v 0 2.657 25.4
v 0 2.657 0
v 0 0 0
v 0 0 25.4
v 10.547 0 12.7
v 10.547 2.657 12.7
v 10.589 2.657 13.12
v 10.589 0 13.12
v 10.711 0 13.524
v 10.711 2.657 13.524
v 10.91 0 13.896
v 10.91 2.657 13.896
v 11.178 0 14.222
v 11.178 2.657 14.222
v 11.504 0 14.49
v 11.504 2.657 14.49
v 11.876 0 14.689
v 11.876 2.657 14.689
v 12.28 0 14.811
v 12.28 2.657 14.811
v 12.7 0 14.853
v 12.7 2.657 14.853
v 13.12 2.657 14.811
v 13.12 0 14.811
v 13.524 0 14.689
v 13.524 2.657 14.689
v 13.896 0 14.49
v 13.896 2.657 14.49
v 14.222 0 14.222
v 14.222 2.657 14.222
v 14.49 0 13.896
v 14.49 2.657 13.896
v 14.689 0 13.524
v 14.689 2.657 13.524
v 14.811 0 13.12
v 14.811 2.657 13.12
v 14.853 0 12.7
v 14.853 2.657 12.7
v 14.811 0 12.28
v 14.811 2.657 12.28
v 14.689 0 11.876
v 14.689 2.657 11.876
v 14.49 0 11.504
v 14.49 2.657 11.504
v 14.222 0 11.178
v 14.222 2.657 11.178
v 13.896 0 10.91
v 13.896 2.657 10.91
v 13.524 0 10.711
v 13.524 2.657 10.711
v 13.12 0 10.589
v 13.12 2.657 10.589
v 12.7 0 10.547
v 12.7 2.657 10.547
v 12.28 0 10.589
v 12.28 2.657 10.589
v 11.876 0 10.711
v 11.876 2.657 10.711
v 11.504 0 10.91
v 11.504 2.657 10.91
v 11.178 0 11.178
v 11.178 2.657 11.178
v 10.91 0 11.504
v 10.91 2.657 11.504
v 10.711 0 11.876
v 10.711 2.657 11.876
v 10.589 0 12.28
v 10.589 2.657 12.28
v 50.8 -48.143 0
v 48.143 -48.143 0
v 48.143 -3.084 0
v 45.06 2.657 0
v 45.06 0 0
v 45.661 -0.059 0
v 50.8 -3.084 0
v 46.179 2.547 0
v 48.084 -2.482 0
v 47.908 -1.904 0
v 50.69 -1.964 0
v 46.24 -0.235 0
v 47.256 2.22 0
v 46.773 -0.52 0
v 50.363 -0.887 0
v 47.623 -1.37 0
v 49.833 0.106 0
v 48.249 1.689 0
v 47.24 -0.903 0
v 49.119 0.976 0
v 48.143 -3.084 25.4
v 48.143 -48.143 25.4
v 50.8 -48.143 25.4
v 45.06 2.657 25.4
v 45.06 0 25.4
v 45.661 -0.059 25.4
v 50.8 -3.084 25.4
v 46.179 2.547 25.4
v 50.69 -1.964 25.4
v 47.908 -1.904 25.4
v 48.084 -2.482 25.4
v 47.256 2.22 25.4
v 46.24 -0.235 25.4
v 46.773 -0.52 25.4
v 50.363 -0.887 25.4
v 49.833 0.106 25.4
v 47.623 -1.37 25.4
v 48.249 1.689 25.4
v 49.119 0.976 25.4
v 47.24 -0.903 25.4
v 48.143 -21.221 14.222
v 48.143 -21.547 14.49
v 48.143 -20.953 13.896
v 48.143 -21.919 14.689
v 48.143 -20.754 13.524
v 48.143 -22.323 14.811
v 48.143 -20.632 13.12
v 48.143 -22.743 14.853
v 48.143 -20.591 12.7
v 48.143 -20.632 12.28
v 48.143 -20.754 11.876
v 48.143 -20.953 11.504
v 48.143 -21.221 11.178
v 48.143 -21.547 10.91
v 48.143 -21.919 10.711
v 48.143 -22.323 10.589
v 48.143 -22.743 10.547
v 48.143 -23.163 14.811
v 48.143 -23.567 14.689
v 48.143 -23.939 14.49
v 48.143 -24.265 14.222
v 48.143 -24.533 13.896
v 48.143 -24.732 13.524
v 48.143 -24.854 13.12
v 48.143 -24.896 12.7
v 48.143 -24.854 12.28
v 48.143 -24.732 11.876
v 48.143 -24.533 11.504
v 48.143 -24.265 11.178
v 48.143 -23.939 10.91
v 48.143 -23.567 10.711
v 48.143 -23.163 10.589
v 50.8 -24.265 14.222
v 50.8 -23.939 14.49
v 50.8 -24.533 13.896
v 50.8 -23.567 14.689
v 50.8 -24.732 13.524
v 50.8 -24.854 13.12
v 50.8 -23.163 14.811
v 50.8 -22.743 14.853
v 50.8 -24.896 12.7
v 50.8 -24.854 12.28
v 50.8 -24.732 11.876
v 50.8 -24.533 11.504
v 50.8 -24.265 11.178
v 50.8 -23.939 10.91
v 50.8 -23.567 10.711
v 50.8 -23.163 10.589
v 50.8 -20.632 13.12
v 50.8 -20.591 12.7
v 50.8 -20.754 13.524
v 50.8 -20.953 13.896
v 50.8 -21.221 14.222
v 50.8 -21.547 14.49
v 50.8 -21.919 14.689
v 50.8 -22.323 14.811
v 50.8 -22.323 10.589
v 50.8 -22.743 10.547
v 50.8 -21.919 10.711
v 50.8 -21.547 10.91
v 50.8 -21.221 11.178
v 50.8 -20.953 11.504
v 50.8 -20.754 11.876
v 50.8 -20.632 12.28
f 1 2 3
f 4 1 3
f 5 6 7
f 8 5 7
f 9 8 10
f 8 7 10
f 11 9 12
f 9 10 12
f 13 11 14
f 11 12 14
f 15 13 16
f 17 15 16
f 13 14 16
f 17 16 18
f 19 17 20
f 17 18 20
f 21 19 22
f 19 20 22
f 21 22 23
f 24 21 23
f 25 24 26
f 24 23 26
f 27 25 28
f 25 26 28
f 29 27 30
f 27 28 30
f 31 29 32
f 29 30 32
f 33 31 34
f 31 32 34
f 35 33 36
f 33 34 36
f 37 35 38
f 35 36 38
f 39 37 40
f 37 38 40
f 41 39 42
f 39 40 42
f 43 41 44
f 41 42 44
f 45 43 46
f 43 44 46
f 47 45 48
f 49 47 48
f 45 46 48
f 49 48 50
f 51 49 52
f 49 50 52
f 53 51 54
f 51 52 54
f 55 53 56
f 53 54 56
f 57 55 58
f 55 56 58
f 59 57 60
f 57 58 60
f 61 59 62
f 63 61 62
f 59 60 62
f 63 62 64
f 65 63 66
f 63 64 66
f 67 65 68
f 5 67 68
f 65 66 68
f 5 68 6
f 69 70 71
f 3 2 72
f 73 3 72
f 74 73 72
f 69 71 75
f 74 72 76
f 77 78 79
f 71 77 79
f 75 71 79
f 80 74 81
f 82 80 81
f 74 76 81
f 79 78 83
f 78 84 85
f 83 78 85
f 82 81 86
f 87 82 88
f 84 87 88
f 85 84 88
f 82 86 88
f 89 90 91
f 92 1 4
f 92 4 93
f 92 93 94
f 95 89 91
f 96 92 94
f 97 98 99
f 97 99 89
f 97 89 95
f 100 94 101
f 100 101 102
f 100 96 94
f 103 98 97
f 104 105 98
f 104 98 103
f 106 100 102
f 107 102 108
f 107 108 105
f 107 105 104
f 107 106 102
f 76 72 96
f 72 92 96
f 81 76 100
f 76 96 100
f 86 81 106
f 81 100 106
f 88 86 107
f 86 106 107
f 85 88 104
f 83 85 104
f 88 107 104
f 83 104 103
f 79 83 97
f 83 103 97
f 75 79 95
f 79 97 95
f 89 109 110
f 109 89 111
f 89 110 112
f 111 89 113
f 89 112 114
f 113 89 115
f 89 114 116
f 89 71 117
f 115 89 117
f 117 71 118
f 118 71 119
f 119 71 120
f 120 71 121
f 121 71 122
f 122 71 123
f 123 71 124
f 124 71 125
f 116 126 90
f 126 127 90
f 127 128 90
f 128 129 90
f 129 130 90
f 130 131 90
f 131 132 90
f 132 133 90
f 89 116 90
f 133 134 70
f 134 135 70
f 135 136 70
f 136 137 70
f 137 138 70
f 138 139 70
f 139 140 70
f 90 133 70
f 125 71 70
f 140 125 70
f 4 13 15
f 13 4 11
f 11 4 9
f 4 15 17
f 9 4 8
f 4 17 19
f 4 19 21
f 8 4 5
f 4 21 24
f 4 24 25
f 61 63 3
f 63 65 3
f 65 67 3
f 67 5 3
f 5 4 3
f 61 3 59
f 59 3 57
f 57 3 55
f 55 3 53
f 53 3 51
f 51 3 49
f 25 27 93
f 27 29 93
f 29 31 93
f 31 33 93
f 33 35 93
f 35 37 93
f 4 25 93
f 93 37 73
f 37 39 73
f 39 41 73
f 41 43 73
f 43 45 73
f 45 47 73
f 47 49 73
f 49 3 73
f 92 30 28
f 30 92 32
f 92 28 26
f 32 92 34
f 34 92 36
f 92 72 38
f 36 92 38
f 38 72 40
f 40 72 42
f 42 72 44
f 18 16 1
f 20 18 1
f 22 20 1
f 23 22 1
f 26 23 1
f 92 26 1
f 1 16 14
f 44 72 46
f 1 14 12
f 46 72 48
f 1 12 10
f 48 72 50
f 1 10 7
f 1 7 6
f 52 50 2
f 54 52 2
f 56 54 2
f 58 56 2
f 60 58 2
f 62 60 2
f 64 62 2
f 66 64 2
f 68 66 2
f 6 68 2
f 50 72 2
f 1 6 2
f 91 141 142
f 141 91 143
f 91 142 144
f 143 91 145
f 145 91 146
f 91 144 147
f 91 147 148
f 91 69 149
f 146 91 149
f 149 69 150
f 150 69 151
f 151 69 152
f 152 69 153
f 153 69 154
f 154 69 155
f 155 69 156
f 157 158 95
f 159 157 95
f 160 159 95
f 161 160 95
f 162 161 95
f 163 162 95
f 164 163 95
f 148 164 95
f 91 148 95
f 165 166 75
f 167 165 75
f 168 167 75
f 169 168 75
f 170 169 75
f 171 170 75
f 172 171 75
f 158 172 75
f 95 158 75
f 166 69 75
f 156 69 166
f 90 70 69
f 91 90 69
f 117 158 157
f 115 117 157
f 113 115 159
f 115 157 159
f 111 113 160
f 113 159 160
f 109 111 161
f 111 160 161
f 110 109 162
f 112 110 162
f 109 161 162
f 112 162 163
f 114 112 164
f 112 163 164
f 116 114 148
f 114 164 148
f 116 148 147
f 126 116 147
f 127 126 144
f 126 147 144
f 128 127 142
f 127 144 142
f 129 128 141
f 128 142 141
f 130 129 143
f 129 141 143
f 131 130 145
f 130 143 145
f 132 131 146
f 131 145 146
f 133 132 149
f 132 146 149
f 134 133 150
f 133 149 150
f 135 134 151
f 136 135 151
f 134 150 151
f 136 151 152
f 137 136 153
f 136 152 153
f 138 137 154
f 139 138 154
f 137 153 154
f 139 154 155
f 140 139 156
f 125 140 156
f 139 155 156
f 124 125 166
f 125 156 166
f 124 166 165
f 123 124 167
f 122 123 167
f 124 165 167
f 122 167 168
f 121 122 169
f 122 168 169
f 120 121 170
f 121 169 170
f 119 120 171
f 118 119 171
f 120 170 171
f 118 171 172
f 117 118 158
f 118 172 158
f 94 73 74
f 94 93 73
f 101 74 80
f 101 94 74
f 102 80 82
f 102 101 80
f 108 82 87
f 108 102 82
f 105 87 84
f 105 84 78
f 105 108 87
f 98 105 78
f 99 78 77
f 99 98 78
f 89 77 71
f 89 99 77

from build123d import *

# Parameters (mm, degrees)
F1_DEPTH = 25.4
F2_R     = 2.15265
F3_DEPTH = 2.65684
F4_R     = 2.15265
F5_DEPTH = 2.65684
F6_R     = 3.08356
F7_R     = 5.7404


with BuildPart() as f1:
    # F0 (on Top) → F1 (new body)
    with BuildSketch(Plane.XY):
        Polygon((0, 2.65684), (0, 0), (48.14316, 0), (48.14316, -48.14316), (50.8, -48.14316), (50.8, 2.65684), align=None)
    extrude(amount=F1_DEPTH)

    # F2 (on face) → F3 (cut, through all)
    with BuildSketch(Plane(origin=(0, 2.65684, 0), x_dir=(-1, 0, 0), z_dir=(0, 1, 0))):
        with Locations((-12.7, 12.7)):
            Circle(F2_R)
    extrude(amount=-F3_DEPTH, mode=Mode.SUBTRACT)

    # F4 (on face) → F5 (cut, through all)
    with BuildSketch(Plane.YZ.offset(50.8)):
        with Locations((-22.74316, 12.7)):
            Circle(F4_R)
    extrude(amount=-F5_DEPTH, mode=Mode.SUBTRACT)

    # F6
    f6_edges = [f1.edges().sort_by_distance(p)[0] for p in [
        (48.14316, 0, 12.7),
    ]]
    fillet(f6_edges, radius=F6_R)

    # F7
    f7_edges = [f1.edges().sort_by_distance(p)[0] for p in [
        (50.8, 2.65684, 12.7),
    ]]
    fillet(f7_edges, radius=F7_R)


solid = f1.part
